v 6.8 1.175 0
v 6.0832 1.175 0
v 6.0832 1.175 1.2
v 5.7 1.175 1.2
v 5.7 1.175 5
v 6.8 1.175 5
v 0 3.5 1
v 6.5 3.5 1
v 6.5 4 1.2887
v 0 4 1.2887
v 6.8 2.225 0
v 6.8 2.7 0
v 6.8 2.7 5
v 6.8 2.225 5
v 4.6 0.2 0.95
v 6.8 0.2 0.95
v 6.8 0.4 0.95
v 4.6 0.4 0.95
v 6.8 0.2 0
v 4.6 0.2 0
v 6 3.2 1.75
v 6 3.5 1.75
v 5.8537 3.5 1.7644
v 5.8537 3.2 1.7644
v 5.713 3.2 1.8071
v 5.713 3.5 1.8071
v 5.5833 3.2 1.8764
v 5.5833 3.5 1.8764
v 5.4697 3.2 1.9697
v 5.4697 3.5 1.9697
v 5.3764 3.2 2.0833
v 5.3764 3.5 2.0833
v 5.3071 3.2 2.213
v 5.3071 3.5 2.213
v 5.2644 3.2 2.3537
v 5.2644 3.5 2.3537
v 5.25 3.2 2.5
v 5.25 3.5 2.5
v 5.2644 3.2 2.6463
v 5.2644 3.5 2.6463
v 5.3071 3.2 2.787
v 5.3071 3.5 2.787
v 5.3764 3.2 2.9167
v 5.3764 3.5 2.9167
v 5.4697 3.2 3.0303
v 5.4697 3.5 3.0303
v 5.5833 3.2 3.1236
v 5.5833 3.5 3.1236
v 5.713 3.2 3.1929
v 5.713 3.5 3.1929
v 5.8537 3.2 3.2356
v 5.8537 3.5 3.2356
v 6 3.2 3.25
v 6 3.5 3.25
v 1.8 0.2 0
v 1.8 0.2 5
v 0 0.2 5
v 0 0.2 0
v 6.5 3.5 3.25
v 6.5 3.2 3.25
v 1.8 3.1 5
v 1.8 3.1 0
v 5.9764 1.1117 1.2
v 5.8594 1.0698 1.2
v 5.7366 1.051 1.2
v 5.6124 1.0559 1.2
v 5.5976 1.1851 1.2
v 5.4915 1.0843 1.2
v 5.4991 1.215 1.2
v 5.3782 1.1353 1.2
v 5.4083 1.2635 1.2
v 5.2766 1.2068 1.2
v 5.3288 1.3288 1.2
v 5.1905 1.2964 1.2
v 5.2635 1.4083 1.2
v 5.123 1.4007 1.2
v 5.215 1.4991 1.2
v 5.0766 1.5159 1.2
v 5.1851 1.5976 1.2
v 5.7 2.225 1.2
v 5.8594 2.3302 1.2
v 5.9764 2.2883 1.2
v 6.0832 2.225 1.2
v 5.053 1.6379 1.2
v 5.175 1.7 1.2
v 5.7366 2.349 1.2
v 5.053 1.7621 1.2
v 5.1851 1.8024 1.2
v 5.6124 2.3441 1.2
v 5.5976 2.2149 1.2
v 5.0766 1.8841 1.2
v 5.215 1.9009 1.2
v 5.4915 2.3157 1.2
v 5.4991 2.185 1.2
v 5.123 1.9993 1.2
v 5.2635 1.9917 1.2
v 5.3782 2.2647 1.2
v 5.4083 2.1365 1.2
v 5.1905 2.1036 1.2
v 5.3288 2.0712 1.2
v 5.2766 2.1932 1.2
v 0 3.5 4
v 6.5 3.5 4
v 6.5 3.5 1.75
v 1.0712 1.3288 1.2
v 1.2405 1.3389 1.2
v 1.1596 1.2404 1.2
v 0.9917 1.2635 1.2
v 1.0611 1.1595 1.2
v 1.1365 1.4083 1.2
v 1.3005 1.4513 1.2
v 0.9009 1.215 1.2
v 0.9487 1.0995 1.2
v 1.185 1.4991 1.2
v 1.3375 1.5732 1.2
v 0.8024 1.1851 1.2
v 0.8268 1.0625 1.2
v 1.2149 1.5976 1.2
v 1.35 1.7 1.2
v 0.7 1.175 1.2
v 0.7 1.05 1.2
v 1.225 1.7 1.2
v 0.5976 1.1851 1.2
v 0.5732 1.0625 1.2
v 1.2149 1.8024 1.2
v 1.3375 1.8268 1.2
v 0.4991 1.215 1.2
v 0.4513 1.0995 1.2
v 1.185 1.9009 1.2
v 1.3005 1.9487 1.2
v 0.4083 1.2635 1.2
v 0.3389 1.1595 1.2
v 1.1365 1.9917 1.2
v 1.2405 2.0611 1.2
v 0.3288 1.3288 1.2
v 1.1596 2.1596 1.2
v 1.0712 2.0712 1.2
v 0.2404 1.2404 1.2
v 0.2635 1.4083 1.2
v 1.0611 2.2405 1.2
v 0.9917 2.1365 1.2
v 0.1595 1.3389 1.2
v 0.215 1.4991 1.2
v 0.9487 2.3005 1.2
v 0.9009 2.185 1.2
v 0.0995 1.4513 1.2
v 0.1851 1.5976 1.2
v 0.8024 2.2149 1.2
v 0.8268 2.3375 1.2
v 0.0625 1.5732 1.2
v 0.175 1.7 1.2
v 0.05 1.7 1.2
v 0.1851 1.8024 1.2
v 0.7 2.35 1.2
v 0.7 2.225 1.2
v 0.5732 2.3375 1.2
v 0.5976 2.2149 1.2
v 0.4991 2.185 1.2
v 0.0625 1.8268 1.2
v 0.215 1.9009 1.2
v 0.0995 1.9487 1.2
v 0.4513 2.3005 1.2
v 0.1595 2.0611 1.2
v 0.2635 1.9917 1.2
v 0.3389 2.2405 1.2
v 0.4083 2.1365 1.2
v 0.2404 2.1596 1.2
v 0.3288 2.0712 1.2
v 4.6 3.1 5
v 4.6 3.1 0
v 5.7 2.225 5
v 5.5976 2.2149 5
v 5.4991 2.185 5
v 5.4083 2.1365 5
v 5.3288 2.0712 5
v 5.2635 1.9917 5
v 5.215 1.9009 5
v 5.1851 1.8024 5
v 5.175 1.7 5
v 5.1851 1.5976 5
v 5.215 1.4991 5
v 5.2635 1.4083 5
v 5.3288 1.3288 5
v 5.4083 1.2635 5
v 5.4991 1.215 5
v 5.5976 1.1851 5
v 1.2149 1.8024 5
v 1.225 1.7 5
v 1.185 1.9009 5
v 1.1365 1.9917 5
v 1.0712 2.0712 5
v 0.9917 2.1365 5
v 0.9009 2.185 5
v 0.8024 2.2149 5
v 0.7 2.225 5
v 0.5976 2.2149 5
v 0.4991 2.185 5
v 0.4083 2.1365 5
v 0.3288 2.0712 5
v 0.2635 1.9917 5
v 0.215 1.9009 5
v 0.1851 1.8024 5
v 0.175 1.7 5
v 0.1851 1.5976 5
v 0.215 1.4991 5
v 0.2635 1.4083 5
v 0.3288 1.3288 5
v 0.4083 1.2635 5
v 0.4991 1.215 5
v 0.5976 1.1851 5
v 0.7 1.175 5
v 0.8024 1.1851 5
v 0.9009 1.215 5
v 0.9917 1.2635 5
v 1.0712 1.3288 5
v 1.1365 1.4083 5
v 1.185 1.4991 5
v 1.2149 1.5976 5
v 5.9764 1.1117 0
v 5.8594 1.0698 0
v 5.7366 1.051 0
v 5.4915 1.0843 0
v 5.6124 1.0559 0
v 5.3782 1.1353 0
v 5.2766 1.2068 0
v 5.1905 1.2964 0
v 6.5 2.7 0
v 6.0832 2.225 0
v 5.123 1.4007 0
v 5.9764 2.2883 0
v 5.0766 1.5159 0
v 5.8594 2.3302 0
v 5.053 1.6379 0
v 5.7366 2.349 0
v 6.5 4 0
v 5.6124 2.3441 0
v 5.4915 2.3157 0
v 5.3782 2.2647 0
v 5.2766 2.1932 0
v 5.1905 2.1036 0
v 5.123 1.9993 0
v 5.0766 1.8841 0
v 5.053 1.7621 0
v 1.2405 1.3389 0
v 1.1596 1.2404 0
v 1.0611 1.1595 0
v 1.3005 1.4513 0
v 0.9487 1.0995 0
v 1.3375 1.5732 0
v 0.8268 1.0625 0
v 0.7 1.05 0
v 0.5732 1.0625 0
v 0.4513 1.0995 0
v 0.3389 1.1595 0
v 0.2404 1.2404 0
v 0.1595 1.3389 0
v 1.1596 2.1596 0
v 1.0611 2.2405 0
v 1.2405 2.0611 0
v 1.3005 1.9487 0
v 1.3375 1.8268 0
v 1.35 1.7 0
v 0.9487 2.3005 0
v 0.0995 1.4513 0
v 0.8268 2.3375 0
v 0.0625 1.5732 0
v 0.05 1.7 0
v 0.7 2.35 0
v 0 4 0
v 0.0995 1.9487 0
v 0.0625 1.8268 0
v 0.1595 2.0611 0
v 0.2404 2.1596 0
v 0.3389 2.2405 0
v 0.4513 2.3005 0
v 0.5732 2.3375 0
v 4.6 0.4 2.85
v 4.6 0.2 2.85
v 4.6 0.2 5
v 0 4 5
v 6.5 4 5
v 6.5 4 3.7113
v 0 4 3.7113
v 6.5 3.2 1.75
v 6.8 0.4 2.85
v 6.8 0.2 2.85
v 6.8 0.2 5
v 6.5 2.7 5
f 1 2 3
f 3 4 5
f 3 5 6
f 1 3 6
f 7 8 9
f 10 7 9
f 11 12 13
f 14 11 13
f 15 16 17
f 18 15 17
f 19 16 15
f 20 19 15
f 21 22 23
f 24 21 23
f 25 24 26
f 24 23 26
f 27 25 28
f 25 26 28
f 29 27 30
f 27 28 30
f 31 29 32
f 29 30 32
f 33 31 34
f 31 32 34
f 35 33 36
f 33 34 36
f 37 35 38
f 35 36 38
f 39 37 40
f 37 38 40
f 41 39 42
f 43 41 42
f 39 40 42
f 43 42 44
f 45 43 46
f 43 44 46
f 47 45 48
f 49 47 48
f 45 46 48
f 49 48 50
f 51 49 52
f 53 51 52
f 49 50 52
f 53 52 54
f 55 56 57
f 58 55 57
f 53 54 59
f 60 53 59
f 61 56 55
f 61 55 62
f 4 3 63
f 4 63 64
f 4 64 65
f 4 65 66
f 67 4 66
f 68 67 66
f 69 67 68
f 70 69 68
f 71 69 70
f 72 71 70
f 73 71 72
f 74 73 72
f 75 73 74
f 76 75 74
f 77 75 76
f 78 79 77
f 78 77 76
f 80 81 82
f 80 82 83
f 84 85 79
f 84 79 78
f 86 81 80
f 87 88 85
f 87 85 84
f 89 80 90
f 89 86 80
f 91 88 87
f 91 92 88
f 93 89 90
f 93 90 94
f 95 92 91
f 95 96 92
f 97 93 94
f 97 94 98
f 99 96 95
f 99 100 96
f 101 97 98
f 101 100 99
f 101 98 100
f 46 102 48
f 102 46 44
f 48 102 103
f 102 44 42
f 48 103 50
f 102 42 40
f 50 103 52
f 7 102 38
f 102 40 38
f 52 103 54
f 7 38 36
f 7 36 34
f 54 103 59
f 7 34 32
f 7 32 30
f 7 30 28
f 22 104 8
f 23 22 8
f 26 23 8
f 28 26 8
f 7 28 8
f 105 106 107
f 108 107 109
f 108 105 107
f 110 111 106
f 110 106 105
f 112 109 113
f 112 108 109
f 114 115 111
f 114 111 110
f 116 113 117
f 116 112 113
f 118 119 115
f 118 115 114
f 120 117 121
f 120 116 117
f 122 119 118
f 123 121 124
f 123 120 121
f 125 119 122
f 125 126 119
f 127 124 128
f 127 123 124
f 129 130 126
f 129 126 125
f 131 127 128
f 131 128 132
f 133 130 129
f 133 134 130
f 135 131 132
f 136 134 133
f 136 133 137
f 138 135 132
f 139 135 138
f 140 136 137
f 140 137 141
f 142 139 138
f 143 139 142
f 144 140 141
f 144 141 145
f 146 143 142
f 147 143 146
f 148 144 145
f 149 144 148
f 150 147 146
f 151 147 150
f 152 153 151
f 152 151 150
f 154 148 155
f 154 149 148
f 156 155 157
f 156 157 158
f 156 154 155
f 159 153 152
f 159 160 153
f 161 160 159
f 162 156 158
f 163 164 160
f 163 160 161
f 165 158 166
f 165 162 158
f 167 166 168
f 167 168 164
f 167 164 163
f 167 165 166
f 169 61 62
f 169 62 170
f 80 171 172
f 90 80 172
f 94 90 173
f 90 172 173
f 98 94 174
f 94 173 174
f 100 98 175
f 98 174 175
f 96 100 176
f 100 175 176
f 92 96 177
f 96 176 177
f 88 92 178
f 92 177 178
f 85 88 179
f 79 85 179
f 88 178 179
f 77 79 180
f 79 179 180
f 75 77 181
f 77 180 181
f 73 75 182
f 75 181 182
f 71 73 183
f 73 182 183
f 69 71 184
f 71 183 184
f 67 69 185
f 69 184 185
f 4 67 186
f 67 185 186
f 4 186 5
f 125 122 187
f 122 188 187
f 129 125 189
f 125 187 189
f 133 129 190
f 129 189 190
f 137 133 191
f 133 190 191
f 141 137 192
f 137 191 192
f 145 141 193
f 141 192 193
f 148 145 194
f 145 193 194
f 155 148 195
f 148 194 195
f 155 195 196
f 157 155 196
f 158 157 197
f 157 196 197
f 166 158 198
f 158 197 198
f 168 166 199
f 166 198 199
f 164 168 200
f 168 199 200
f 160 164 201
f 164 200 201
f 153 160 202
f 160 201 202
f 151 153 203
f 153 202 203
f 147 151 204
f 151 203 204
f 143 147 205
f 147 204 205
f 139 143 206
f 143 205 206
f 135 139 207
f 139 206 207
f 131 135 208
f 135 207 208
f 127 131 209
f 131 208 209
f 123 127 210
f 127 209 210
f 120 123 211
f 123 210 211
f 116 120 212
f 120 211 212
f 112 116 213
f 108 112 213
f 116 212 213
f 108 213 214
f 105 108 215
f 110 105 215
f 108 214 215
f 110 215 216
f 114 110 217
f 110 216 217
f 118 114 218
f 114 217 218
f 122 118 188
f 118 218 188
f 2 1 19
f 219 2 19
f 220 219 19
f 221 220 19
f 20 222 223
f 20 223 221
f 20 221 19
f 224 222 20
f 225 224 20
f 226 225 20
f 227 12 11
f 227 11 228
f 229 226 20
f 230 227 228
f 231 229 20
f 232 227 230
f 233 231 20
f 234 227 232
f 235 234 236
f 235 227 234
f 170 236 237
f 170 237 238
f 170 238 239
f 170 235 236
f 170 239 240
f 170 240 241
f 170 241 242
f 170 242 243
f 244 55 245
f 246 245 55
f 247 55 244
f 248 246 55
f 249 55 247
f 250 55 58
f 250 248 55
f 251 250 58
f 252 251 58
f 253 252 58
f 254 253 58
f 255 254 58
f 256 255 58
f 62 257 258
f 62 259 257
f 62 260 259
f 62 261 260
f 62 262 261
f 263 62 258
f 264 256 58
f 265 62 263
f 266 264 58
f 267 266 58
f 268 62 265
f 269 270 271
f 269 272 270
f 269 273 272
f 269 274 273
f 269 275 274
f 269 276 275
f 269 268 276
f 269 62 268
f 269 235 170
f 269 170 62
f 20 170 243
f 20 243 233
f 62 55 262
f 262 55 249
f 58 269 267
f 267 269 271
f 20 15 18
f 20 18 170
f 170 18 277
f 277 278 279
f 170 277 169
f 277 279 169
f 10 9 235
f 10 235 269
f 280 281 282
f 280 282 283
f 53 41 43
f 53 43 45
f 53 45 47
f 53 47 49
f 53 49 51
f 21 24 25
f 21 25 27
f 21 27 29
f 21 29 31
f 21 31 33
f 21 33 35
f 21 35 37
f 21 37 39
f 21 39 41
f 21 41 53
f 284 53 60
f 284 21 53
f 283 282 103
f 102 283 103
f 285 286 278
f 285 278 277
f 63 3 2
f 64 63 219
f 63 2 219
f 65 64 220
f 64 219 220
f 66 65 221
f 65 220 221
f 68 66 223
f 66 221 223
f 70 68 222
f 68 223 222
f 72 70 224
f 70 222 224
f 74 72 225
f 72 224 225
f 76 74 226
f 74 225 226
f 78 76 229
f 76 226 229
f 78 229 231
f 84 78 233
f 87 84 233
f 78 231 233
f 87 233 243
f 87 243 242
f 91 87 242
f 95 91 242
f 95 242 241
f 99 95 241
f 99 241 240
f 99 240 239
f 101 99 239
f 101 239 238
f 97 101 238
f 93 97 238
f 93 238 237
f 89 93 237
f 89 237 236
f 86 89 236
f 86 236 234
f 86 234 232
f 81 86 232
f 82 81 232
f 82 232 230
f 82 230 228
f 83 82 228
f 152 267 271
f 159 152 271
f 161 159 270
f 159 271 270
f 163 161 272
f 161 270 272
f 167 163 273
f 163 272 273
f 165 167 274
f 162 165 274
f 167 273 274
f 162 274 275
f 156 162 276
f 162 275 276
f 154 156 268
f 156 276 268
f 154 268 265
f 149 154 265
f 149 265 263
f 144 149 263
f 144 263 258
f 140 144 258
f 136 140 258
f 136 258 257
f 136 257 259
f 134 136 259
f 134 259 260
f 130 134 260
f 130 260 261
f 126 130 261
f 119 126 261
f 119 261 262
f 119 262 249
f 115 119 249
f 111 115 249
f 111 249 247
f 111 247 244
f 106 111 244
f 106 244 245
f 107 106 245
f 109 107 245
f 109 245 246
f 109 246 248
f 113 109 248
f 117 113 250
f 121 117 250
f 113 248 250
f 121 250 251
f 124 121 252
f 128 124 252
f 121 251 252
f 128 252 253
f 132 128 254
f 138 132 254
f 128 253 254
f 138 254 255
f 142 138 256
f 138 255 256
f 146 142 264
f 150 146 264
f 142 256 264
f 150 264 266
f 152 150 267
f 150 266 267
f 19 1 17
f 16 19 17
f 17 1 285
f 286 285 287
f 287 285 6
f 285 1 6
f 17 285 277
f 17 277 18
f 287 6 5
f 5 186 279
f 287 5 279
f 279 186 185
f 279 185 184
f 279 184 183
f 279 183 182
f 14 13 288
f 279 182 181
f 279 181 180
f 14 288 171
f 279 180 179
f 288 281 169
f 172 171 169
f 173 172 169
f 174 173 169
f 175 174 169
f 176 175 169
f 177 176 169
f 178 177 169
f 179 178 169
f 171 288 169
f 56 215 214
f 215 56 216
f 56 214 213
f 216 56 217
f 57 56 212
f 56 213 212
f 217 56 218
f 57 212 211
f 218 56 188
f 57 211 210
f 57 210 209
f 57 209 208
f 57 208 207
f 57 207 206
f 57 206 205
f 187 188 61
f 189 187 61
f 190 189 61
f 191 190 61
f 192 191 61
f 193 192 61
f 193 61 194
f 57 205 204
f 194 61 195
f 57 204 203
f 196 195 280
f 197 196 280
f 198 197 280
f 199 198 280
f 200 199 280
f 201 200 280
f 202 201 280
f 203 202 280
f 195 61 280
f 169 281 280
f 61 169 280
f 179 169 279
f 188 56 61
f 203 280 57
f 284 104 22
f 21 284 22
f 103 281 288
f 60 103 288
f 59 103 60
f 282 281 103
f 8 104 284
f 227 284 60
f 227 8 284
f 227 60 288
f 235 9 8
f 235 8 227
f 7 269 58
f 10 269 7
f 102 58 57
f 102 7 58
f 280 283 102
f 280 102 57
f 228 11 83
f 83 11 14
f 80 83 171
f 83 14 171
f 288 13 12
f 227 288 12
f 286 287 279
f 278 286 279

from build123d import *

# Parameters (mm, degrees)
SKETCH1_W           = 6.8
SKETCH1_H           = 5
BOSS_EXTRUDE1_DEPTH = 3.8
SKETCH3_W           = 2.8
SKETCH3_H           = 2.9
CUT_EXTRUDE2_DEPTH  = 10.340235543
SKETCH4_W           = 1.9
SKETCH4_H           = 0.2
CUT_EXTRUDE3_DEPTH  = 2.2
HOLE1_D             = 1.05
HOLE1_CBORE_D       = 1.3
HOLE1_CBORE_DEPTH   = 1.2
CUT_EXTRUDE8_DEPTH  = 10.340235543
CUT_EXTRUDE9_DEPTH  = 10.340235543
CUT_EXTRUDE10_DEPTH = 0.3
SKETCH20_W          = 5
SKETCH20_H          = 1.3
CUT_EXTRUDE11_DEPTH = 0.3


with BuildPart() as part:
    # Sketch1 → Boss-Extrude1 (new body)
    with BuildSketch(Plane(origin=(0, 4, 0), x_dir=(-1, 0, 0), z_dir=(0, 1, 0))):
        with Locations((-3.4, 2.5)):
            Rectangle(SKETCH1_W, SKETCH1_H)
    extrude(amount=-BOSS_EXTRUDE1_DEPTH)

    # Sketch3 → Cut-Extrude2 (cut, through all)
    with BuildSketch(Plane.XY.offset(5)):
        with Locations((3.2, 1.65)):
            Rectangle(SKETCH3_W, SKETCH3_H)
    extrude(amount=-CUT_EXTRUDE2_DEPTH, mode=Mode.SUBTRACT)

    # Sketch4 → Cut-Extrude3 (cut)
    with BuildSketch(Plane(origin=(6.8, 0, 0), x_dir=(0, 0, -1), z_dir=(1, 0, 0))):
        with Locations((-1.9, 0.3)):
            Rectangle(SKETCH4_W, SKETCH4_H)
    extrude(amount=-CUT_EXTRUDE3_DEPTH, mode=Mode.SUBTRACT)

    # Hole1 (through all)
    with Locations(Plane(origin=(0, 0, 0), x_dir=(-1, 0, 0), z_dir=(0, 0, -1))):
        with Locations((-5.7, 1.7), (-0.7, 1.7)):
            CounterBoreHole(HOLE1_D / 2, HOLE1_CBORE_D / 2, HOLE1_CBORE_DEPTH)

    # Sketch17 → Cut-Extrude8 (cut, through all)
    with BuildSketch(Plane.XY.offset(5)):
        with BuildLine():
            Line((6.8, 2.225), (5.7, 2.225))
            ThreePointArc((5.7, 2.225), (6.07123106, 2.07123106), (6.225, 1.7))
            ThreePointArc((6.225, 1.7), (6.07123106, 1.32876894), (5.7, 1.175))
            Line((5.7, 1.175), (6.8, 1.175))
            Line((6.8, 1.175), (6.8, 2.225))
        make_face()
        with BuildLine():
            ThreePointArc((6.225, 1.7), (6.07123106, 2.07123106), (5.7, 2.225))
            Line((5.7, 2.225), (5.7, 1.175))
            ThreePointArc((5.7, 1.175), (6.07123106, 1.32876894), (6.225, 1.7))
        make_face()
        with BuildLine():
            Line((5.7, 1.175), (5.7, 2.225))
            ThreePointArc((5.7, 2.225), (5.175, 1.7), (5.7, 1.175))
        make_face()
    extrude(amount=-CUT_EXTRUDE8_DEPTH, mode=Mode.SUBTRACT)

    # Sketch18 → Cut-Extrude9 (cut, through all)
    with BuildSketch(Plane(origin=(6.8, 0, 0), x_dir=(0, 0, -1), z_dir=(1, 0, 0))):
        Polygon((-1.288675135, 4), (-3.711324865, 4), (-4, 3.5), (-1, 3.5), align=None)
    extrude(amount=-CUT_EXTRUDE9_DEPTH, mode=Mode.SUBTRACT)

    # Sketch19 → Cut-Extrude10 (cut)
    with BuildSketch(Plane(origin=(0, 3.5, 0), x_dir=(1, 0, 0), z_dir=(0, 1, 0))):
        with BuildLine():
            Line((6.8, -1.75), (6, -1.75))
            ThreePointArc((6, -1.75), (6.530330086, -1.969669914), (6.75, -2.5))
            ThreePointArc((6.75, -2.5), (6.530330086, -3.030330086), (6, -3.25))
            Line((6, -3.25), (6.8, -3.25))
            Line((6.8, -3.25), (6.8, -1.75))
        make_face()
        with BuildLine():
            ThreePointArc((6.75, -2.5), (6.530330086, -1.969669914), (6, -1.75))
            Line((6, -1.75), (6, -3.25))
            ThreePointArc((6, -3.25), (6.530330086, -3.030330086), (6.75, -2.5))
        make_face()
        with BuildLine():
            Line((6, -3.25), (6, -1.75))
            ThreePointArc((6, -1.75), (5.25, -2.5), (6, -3.25))
        make_face()
    extrude(amount=-CUT_EXTRUDE10_DEPTH, mode=Mode.SUBTRACT)

    # Sketch20 → Cut-Extrude11 (cut)
    with BuildSketch(Plane(origin=(6.8, 0, 0), x_dir=(0, 0, -1), z_dir=(1, 0, 0))):
        with Locations((-2.5, 3.35)):
            Rectangle(SKETCH20_W, SKETCH20_H)
    extrude(amount=-CUT_EXTRUDE11_DEPTH, mode=Mode.SUBTRACT)


solid = part.part
